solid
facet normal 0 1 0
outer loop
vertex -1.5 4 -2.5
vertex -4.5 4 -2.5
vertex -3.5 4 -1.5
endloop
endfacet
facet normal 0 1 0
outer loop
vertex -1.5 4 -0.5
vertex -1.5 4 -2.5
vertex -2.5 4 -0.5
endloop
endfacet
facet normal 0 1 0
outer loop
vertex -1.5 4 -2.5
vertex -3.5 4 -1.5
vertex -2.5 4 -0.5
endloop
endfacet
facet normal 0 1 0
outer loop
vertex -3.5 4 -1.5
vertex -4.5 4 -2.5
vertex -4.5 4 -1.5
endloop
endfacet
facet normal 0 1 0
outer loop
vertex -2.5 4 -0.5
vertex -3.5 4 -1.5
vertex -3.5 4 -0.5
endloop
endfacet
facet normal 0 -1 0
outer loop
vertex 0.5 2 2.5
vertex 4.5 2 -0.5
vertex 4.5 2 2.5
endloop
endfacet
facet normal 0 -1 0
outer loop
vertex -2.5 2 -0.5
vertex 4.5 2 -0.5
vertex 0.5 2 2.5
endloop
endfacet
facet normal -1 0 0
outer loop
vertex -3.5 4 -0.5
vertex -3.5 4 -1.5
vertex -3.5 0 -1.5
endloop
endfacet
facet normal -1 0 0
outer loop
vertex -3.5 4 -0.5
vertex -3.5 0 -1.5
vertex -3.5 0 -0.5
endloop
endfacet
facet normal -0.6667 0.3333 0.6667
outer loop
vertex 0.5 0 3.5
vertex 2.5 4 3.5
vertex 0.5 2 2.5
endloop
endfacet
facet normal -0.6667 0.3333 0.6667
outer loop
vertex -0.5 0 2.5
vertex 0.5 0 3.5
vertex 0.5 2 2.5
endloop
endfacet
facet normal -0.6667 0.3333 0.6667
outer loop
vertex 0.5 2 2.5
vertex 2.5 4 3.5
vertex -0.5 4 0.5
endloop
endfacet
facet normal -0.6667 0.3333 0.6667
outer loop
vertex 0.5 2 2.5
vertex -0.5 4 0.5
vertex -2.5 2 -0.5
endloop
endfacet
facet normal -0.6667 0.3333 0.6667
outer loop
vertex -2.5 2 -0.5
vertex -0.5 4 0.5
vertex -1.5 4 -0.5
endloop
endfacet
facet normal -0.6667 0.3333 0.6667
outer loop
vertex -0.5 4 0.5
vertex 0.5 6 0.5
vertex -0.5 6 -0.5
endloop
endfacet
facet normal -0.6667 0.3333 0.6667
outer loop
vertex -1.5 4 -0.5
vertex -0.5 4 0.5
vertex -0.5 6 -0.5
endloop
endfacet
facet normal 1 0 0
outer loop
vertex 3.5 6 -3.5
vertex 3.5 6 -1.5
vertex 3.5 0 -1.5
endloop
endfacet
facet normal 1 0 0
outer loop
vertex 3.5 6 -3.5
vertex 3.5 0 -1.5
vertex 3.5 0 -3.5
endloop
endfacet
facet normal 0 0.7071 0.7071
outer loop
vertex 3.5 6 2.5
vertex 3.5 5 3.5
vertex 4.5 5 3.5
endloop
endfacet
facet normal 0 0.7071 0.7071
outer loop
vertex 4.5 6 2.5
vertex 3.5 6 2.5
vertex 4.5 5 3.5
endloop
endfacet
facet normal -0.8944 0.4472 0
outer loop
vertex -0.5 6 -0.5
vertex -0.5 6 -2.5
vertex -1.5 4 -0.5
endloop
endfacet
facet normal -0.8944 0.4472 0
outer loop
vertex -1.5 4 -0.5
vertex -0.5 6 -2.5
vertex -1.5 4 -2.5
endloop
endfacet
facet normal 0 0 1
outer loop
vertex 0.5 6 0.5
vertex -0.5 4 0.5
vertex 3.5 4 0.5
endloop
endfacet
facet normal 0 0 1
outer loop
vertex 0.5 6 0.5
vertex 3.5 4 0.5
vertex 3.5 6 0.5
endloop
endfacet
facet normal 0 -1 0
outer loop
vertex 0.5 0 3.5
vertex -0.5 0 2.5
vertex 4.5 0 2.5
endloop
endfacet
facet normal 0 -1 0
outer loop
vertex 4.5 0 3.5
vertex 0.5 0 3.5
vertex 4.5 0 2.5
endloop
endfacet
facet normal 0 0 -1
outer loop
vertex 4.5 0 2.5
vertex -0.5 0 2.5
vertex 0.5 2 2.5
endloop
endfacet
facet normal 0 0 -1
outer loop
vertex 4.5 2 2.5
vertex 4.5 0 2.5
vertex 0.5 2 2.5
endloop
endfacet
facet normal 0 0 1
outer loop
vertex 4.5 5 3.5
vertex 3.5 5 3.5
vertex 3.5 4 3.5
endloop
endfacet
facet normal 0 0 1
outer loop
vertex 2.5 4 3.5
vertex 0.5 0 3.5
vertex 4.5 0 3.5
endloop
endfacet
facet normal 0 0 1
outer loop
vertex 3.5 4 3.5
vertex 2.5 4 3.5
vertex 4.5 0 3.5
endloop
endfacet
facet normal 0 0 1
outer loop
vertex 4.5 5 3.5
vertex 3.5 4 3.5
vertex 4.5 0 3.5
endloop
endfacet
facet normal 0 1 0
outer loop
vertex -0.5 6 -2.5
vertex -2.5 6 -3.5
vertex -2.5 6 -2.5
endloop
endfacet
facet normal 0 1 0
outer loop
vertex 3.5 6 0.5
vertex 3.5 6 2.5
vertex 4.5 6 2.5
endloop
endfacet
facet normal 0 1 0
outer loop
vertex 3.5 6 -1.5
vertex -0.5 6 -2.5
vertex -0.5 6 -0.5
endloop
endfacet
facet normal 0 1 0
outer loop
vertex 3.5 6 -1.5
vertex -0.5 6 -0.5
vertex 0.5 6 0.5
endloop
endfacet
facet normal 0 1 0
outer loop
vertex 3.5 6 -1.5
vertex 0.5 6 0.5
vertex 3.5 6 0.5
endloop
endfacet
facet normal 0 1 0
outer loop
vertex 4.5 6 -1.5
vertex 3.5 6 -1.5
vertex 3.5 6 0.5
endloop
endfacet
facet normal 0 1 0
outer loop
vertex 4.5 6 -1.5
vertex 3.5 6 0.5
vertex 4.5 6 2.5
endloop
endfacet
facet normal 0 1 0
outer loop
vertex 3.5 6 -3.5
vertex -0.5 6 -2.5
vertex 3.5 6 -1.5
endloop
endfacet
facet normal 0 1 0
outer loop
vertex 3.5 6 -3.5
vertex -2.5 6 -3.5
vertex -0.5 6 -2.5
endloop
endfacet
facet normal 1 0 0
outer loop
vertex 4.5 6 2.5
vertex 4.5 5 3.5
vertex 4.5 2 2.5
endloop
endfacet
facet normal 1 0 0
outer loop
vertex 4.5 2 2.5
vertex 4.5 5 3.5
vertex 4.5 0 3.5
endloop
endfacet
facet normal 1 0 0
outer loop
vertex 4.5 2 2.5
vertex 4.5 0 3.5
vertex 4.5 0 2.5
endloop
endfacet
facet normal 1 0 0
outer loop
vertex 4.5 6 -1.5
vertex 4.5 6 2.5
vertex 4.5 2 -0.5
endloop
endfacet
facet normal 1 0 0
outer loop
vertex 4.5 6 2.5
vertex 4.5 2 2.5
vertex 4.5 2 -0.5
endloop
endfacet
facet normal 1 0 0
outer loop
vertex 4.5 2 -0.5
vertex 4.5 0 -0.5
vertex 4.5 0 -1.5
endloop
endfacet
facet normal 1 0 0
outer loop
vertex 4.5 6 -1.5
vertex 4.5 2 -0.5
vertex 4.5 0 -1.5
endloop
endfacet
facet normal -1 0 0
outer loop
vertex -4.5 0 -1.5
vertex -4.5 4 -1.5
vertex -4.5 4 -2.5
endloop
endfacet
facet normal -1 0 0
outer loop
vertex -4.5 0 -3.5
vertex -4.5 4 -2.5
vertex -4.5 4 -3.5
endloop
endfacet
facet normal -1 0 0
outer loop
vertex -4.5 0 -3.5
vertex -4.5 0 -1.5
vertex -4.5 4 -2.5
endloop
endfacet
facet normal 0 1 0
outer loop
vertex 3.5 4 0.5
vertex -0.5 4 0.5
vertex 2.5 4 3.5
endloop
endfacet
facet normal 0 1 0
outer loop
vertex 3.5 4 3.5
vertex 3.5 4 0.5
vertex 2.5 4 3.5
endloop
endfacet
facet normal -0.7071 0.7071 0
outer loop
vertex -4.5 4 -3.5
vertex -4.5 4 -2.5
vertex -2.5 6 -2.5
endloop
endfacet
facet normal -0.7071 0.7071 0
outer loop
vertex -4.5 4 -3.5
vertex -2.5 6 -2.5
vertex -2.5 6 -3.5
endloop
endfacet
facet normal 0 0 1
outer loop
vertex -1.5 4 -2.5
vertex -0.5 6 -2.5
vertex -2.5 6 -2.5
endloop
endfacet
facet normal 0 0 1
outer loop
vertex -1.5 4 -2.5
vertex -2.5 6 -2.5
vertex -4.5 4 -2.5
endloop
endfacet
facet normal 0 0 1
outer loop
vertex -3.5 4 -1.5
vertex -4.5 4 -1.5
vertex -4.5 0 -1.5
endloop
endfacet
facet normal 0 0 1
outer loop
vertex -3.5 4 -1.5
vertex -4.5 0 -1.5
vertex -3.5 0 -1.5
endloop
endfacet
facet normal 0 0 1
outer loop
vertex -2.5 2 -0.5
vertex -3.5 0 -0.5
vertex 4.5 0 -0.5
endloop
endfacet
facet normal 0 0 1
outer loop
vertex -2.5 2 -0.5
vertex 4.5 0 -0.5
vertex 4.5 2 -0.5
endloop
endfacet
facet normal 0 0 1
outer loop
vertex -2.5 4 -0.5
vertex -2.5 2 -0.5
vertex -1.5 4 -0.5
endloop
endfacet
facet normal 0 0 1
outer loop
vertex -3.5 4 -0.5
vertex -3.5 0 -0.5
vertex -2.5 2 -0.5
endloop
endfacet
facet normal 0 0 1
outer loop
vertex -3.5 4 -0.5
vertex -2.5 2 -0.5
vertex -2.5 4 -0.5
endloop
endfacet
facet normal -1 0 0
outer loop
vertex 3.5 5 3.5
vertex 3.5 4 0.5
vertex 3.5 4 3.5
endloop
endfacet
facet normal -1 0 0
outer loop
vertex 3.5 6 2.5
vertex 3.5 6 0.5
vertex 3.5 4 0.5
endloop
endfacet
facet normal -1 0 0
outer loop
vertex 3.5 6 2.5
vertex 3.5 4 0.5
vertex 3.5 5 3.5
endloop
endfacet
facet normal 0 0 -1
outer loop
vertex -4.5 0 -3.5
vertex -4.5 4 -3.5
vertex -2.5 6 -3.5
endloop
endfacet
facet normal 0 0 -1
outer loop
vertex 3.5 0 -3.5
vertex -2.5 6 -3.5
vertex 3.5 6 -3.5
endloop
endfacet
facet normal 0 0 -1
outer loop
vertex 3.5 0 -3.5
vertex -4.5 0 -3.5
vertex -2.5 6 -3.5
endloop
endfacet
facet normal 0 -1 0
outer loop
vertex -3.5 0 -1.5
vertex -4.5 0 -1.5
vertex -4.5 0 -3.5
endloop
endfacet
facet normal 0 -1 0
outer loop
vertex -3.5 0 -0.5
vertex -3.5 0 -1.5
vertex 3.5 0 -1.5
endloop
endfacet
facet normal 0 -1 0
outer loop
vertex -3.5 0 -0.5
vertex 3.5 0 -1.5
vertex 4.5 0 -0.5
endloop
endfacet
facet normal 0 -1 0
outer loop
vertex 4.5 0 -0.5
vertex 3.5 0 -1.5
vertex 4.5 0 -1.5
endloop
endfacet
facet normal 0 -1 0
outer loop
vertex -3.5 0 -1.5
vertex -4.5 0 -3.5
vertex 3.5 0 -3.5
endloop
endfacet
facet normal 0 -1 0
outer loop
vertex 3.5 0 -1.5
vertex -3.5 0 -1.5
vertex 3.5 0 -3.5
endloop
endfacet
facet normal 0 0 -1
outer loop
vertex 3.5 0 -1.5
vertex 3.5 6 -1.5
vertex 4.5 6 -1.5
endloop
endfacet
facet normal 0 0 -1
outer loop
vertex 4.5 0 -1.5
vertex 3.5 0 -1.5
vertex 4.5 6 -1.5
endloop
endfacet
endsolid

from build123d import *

# Parameters (mm, degrees)
SKETCH1_W               = 9
SKETCH1_H               = 7
BOSS_EXTRUDE1_DEPTH     = 6
SKETCH2_W               = 3
SKETCH2_H               = 2
CUT_EXTRUDE1_DEPTH      = 12.368817001
SKETCH3_W               = 3
SKETCH3_H               = 2
CUT_EXTRUDE2_DEPTH      = 8
CHAMFER1_SIZE           = 1
SKETCH4_W               = 1
SKETCH4_H               = 2
CUT_EXTRUDE3_DEPTH      = 9.276472679
SKETCH5_W               = 3
SKETCH5_H               = 2
CUT_EXTRUDE4_DEPTH      = 2
CHAMFER2_SIZE           = 2
CUT_EXTRUDE5_DEPTH      = 2
CUT_EXTRUDE5_DEPTH_BACK = 1
CUT_EXTRUDE6_DEPTH      = 5.094054233
CUT_EXTRUDE7_DEPTH      = 5.094054233


with BuildPart() as part:
    # Sketch1 → Boss-Extrude1 (new body)
    with BuildSketch(Plane(origin=(0, 0, 0), x_dir=(1, 0, 0), z_dir=(0, 1, 0))):
        Rectangle(SKETCH1_W, SKETCH1_H)
    extrude(amount=BOSS_EXTRUDE1_DEPTH)

    # Sketch2 → Cut-Extrude1 (cut, through all)
    with BuildSketch(Plane.ZY.offset(4.5)):
        with Locations((1, 1)):
            Rectangle(SKETCH2_W, SKETCH2_H)
    extrude(amount=-CUT_EXTRUDE1_DEPTH, mode=Mode.SUBTRACT)

    # Sketch3 → Cut-Extrude2 (cut)
    with BuildSketch(Plane.ZY.offset(4.5)):
        with Locations((2, 5)):
            Rectangle(SKETCH3_W, SKETCH3_H)
    extrude(amount=-CUT_EXTRUDE2_DEPTH, mode=Mode.SUBTRACT)

    # Chamfer1
    chamfer1_edges = [part.edges().sort_by_distance(p)[0] for p in [
        (4, 6, 3.5),
    ]]
    chamfer(chamfer1_edges, length=CHAMFER1_SIZE)

    # Sketch4 → Cut-Extrude3 (cut, through all)
    with BuildSketch(Plane(origin=(0, 6, 0), x_dir=(1, 0, 0), z_dir=(0, 1, 0))):
        with Locations((4, 2.5)):
            Rectangle(SKETCH4_W, SKETCH4_H)
    extrude(amount=-CUT_EXTRUDE3_DEPTH, mode=Mode.SUBTRACT)

    # Sketch5 → Cut-Extrude4 (cut)
    with BuildSketch(Plane(origin=(0, 6, 0), x_dir=(1, 0, 0), z_dir=(0, 1, 0))):
        with Locations((-3, 0.5)):
            Rectangle(SKETCH5_W, SKETCH5_H)
    extrude(amount=-CUT_EXTRUDE4_DEPTH, mode=Mode.SUBTRACT)

    # Chamfer2
    chamfer2_edges = [part.edges().sort_by_distance(p)[0] for p in [
        (-4.5, 6, -2.5),
    ]]
    chamfer(chamfer2_edges, length=CHAMFER2_SIZE)

    # Sketch6 → Cut-Extrude5 (cut, two sides)
    with BuildSketch(Plane.XY.offset(-1.5)) as cut_extrude5_sk:
        Polygon((-4.5, 4), (-2.5, 6), (-0.5, 6), (-1.5, 4), align=None)
    extrude(amount=CUT_EXTRUDE5_DEPTH, mode=Mode.SUBTRACT)
    extrude(cut_extrude5_sk.sketch, amount=-CUT_EXTRUDE5_DEPTH_BACK, mode=Mode.SUBTRACT)

    # Sketch7 → Cut-Extrude6 (cut)
    with BuildSketch(Plane(origin=(0, 4, 0), x_dir=(1, 0, 0), z_dir=(0, 1, 0))):
        Polygon((-4.5, 1.5), (-3.5, 1.5), (-3.5, 0.5), (-2.5, 0.5), (-2.5, -3.5), (-4.5, -3.5), align=None)
    extrude(amount=-CUT_EXTRUDE6_DEPTH, mode=Mode.SUBTRACT)

    # 3DSketch1 → Cut-Extrude7 (cut, along a direction that is not the sketch's normal)
    with BuildSketch(Plane(origin=(2.5, 4, 3.5), x_dir=(-0.7453559924999292, -0.29814239699997236, -0.5962847939999446), z_dir=(0.6666666666666674, -0.33333333333333376, -0.6666666666666657))):
        Polygon((0, 0), (2.683281573, -3.577708764), (4.024922359, -3.130495168), (2.683281573, -1.341640786), (6.708203932, 0), (4.024922359, 3.577708764), (2.683281573, 3.130495168), (4.024922359, 1.341640786), align=None)
    extrude(amount=-CUT_EXTRUDE7_DEPTH, dir=(1, 0, 0), mode=Mode.SUBTRACT)


solid = part.part
